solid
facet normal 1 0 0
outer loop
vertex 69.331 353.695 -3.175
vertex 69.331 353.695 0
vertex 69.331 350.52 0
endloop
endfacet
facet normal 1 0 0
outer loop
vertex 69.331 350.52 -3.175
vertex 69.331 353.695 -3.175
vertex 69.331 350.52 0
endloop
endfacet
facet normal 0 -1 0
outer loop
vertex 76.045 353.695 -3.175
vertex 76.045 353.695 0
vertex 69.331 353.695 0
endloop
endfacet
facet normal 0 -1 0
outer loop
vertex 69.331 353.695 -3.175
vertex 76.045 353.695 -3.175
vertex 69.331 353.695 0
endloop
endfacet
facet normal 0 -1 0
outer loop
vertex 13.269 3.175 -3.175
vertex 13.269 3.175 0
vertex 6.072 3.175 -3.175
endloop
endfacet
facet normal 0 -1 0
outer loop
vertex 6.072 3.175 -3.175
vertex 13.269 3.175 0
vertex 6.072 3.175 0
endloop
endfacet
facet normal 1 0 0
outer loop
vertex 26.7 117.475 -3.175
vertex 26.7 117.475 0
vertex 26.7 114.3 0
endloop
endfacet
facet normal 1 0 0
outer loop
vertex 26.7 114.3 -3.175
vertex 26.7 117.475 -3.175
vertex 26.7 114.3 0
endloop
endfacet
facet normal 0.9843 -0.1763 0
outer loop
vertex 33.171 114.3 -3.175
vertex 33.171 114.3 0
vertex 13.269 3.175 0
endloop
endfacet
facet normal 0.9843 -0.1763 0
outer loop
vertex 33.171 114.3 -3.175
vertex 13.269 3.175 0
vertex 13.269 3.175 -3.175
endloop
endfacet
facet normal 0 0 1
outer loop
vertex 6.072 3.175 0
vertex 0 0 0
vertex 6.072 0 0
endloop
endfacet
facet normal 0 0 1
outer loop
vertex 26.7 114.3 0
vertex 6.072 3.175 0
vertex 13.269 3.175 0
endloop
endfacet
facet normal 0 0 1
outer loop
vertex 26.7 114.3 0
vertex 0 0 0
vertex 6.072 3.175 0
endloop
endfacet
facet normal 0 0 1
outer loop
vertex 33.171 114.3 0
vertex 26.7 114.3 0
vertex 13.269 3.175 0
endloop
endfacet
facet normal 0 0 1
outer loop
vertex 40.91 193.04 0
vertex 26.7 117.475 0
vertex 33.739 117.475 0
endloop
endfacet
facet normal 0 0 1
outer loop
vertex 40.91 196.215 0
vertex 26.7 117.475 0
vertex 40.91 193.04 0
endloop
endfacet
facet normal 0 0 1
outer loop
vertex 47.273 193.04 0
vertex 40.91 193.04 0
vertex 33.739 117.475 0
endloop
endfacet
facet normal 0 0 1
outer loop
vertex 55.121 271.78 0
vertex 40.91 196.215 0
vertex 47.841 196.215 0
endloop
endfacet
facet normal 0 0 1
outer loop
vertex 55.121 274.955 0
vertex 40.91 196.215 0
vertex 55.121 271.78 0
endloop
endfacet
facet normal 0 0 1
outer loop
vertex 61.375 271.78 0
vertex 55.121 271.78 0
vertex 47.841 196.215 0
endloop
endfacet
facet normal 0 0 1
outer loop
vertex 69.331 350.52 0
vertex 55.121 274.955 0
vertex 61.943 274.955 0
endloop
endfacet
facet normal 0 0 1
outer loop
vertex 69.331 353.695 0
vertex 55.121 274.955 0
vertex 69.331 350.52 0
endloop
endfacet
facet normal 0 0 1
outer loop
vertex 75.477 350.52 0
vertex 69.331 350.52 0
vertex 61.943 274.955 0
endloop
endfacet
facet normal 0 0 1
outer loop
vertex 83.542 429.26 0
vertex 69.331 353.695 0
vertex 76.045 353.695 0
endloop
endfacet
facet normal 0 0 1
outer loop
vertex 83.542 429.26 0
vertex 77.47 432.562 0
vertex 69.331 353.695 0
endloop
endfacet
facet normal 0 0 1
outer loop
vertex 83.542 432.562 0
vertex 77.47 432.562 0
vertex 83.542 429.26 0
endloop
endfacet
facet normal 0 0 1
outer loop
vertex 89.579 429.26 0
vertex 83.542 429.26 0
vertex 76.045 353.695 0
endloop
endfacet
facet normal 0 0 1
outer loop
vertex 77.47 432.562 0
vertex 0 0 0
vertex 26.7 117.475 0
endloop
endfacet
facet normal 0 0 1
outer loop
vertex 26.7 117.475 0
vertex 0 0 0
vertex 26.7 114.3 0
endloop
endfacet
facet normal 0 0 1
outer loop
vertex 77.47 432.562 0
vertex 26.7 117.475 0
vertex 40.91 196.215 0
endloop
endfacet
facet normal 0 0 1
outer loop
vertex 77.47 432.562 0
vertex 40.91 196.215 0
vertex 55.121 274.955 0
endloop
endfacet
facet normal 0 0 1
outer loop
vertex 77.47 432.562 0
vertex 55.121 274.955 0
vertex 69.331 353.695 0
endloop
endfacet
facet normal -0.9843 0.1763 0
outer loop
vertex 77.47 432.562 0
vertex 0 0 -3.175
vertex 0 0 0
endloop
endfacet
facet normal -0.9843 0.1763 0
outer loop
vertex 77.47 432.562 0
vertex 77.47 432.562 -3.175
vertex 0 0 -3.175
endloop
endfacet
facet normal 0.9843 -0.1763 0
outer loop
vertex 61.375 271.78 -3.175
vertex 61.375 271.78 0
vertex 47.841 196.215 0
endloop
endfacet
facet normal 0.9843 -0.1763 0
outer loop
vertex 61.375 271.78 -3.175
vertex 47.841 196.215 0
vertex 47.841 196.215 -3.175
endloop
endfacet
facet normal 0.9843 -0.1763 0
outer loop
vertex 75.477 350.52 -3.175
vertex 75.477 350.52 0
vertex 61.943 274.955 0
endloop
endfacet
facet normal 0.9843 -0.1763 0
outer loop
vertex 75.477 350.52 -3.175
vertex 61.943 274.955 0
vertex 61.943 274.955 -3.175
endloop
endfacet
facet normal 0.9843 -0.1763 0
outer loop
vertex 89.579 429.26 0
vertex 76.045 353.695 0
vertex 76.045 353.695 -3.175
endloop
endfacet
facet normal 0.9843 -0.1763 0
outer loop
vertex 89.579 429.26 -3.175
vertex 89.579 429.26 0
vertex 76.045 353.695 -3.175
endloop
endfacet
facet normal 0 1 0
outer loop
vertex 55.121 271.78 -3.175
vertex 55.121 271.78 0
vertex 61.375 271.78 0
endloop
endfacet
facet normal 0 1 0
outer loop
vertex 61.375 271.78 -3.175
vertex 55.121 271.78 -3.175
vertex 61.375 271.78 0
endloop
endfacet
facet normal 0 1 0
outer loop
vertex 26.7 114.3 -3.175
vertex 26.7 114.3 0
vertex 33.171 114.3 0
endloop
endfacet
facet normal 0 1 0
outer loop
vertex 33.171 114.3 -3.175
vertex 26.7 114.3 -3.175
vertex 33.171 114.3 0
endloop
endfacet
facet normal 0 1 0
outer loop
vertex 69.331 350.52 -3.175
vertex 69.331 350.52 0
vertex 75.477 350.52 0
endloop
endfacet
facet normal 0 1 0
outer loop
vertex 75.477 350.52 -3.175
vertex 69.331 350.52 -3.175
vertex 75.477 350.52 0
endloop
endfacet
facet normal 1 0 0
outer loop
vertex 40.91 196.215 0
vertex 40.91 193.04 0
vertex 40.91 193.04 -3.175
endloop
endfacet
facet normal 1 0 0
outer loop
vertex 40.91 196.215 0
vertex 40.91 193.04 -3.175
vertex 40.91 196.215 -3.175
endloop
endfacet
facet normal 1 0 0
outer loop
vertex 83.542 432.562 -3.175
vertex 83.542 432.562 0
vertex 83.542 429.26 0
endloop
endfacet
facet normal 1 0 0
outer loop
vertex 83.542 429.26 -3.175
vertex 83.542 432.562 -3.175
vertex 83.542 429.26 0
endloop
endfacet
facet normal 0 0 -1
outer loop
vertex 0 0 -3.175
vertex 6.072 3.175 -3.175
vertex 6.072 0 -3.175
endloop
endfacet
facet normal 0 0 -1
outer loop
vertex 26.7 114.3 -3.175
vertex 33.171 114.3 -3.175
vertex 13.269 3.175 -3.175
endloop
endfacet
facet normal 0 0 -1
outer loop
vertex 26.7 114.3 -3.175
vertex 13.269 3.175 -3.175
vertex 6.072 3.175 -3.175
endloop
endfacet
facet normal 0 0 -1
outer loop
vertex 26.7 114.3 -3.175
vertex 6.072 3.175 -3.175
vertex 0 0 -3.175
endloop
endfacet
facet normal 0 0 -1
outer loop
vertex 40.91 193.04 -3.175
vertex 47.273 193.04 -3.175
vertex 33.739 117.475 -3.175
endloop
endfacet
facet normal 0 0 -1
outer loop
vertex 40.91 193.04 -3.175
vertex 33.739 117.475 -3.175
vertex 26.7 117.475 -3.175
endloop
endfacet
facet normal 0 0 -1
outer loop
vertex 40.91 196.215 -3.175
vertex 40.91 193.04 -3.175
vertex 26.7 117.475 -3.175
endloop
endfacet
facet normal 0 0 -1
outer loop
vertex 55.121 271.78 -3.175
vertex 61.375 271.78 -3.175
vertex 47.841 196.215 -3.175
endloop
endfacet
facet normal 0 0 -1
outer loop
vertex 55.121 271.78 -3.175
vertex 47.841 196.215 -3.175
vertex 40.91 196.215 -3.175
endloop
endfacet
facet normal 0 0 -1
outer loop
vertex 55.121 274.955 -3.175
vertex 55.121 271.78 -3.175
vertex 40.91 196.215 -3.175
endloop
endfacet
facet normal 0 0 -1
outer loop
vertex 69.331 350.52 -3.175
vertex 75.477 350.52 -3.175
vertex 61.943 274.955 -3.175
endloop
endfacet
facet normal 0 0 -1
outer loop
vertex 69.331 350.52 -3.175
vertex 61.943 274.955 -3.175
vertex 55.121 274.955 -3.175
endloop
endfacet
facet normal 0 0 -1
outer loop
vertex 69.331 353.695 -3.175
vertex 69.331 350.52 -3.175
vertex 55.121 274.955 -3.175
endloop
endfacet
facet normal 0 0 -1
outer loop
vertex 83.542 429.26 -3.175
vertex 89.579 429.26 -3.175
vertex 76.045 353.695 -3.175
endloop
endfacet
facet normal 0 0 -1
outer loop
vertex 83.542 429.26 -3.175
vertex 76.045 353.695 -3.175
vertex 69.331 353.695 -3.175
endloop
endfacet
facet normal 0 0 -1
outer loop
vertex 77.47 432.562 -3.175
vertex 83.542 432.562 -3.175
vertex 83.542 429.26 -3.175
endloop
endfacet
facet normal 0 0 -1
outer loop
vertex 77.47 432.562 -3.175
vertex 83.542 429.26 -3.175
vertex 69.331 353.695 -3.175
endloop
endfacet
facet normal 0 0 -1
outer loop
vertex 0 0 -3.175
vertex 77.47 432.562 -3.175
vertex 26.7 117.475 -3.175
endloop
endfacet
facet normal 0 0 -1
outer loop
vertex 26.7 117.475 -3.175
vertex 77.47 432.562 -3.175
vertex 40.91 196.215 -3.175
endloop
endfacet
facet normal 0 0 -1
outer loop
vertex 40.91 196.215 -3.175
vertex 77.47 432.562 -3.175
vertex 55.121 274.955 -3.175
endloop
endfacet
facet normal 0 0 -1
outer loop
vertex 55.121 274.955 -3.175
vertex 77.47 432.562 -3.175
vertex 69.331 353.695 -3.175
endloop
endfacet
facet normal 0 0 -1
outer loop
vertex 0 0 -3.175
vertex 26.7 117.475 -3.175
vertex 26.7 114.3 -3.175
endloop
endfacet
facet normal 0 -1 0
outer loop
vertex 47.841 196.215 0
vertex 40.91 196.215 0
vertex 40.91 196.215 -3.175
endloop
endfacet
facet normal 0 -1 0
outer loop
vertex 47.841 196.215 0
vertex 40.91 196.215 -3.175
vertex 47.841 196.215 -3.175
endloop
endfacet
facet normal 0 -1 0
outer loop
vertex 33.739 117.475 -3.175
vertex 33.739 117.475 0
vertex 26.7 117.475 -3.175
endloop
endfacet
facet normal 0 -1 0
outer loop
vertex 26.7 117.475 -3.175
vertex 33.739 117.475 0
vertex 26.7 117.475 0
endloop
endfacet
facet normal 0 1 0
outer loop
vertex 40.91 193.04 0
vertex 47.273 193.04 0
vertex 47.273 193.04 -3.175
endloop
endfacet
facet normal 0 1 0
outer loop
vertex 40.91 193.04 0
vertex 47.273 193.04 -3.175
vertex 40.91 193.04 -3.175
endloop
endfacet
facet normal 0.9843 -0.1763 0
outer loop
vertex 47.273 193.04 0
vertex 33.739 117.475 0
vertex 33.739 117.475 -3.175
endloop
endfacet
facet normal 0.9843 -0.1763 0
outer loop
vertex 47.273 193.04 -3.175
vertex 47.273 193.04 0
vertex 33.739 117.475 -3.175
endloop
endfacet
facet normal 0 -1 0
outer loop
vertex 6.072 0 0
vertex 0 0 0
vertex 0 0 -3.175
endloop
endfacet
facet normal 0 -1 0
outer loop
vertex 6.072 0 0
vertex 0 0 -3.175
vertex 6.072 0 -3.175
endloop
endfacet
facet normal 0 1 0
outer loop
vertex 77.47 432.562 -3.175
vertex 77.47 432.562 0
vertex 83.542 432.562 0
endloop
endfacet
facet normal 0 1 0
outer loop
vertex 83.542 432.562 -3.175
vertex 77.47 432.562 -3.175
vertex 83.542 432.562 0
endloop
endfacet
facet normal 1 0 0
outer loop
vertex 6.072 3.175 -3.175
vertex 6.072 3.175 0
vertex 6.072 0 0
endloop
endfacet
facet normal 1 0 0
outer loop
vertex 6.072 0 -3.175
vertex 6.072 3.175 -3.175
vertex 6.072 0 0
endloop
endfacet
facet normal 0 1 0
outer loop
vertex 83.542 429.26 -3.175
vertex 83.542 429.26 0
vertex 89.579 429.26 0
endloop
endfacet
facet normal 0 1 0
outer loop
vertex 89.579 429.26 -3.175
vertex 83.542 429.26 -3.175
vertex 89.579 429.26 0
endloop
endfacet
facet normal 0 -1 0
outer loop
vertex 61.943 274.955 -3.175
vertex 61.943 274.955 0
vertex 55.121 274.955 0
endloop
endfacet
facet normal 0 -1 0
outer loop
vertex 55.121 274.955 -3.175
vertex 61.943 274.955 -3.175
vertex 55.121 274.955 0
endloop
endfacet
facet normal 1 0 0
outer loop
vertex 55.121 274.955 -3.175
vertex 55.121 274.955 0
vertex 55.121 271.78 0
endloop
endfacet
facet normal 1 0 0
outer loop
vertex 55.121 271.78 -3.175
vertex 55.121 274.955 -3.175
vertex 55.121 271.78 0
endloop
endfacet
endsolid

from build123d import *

# Parameters (mm, degrees)
CUT_EXTRUDE1_DEPTH = 5.08


with BuildPart() as part:
    # Sketch1 → Loft1 section 0
    with BuildSketch(Plane(origin=(0, 0, 0), x_dir=(1, 0, 0), z_dir=(0, 1, 0))):
        with BuildLine():
            Line((0, 0), (12.7, 0))
            Line((12.7, 0), (12.7, 3.175))
            Line((12.7, 3.175), (0, 3.175))
            Line((0, 3.175), (0, 0))
        make_face()
    # Sketch2 → Loft1 section 1
    with BuildSketch(Plane(origin=(0, 432.562, 0), x_dir=(1, 0, 0), z_dir=(0, 1, 0))):
        with BuildLine():
            Line((77.47, 0), (90.17, 0))
            Line((90.17, 0), (90.17, 3.175))
            Line((90.17, 3.175), (77.47, 3.175))
            Line((77.47, 3.175), (77.47, 0))
        make_face()
    loft()

    # Sketch3 → Cut-Extrude1 (cut)
    with BuildSketch(Plane.XY):
        Polygon((83.541818167, 432.562), (83.541818167, 429.26), (89.578625954, 429.26), (90.17, 432.562), align=None)
        Polygon((6.071818167, 3.175), (6.071818167, 0), (12.7, 0), (13.26862889, 3.175), align=None)
        Polygon((26.699924676, 117.475), (26.699924676, 114.3), (33.170640047, 114.3), (33.739268937, 117.475), align=None)
        Polygon((69.331344794, 353.695), (69.331344794, 350.52), (75.476629477, 350.52), (76.045258368, 353.695), align=None)
        Polygon((55.120871422, 274.955), (55.120871422, 271.78), (61.374633001, 271.78), (61.943261891, 274.955), align=None)
        Polygon((40.910398049, 193.04), (40.910398049, 196.215), (47.841265414, 196.215), (47.272636524, 193.04), align=None)
    extrude(amount=-CUT_EXTRUDE1_DEPTH, mode=Mode.SUBTRACT)


solid = part.part
